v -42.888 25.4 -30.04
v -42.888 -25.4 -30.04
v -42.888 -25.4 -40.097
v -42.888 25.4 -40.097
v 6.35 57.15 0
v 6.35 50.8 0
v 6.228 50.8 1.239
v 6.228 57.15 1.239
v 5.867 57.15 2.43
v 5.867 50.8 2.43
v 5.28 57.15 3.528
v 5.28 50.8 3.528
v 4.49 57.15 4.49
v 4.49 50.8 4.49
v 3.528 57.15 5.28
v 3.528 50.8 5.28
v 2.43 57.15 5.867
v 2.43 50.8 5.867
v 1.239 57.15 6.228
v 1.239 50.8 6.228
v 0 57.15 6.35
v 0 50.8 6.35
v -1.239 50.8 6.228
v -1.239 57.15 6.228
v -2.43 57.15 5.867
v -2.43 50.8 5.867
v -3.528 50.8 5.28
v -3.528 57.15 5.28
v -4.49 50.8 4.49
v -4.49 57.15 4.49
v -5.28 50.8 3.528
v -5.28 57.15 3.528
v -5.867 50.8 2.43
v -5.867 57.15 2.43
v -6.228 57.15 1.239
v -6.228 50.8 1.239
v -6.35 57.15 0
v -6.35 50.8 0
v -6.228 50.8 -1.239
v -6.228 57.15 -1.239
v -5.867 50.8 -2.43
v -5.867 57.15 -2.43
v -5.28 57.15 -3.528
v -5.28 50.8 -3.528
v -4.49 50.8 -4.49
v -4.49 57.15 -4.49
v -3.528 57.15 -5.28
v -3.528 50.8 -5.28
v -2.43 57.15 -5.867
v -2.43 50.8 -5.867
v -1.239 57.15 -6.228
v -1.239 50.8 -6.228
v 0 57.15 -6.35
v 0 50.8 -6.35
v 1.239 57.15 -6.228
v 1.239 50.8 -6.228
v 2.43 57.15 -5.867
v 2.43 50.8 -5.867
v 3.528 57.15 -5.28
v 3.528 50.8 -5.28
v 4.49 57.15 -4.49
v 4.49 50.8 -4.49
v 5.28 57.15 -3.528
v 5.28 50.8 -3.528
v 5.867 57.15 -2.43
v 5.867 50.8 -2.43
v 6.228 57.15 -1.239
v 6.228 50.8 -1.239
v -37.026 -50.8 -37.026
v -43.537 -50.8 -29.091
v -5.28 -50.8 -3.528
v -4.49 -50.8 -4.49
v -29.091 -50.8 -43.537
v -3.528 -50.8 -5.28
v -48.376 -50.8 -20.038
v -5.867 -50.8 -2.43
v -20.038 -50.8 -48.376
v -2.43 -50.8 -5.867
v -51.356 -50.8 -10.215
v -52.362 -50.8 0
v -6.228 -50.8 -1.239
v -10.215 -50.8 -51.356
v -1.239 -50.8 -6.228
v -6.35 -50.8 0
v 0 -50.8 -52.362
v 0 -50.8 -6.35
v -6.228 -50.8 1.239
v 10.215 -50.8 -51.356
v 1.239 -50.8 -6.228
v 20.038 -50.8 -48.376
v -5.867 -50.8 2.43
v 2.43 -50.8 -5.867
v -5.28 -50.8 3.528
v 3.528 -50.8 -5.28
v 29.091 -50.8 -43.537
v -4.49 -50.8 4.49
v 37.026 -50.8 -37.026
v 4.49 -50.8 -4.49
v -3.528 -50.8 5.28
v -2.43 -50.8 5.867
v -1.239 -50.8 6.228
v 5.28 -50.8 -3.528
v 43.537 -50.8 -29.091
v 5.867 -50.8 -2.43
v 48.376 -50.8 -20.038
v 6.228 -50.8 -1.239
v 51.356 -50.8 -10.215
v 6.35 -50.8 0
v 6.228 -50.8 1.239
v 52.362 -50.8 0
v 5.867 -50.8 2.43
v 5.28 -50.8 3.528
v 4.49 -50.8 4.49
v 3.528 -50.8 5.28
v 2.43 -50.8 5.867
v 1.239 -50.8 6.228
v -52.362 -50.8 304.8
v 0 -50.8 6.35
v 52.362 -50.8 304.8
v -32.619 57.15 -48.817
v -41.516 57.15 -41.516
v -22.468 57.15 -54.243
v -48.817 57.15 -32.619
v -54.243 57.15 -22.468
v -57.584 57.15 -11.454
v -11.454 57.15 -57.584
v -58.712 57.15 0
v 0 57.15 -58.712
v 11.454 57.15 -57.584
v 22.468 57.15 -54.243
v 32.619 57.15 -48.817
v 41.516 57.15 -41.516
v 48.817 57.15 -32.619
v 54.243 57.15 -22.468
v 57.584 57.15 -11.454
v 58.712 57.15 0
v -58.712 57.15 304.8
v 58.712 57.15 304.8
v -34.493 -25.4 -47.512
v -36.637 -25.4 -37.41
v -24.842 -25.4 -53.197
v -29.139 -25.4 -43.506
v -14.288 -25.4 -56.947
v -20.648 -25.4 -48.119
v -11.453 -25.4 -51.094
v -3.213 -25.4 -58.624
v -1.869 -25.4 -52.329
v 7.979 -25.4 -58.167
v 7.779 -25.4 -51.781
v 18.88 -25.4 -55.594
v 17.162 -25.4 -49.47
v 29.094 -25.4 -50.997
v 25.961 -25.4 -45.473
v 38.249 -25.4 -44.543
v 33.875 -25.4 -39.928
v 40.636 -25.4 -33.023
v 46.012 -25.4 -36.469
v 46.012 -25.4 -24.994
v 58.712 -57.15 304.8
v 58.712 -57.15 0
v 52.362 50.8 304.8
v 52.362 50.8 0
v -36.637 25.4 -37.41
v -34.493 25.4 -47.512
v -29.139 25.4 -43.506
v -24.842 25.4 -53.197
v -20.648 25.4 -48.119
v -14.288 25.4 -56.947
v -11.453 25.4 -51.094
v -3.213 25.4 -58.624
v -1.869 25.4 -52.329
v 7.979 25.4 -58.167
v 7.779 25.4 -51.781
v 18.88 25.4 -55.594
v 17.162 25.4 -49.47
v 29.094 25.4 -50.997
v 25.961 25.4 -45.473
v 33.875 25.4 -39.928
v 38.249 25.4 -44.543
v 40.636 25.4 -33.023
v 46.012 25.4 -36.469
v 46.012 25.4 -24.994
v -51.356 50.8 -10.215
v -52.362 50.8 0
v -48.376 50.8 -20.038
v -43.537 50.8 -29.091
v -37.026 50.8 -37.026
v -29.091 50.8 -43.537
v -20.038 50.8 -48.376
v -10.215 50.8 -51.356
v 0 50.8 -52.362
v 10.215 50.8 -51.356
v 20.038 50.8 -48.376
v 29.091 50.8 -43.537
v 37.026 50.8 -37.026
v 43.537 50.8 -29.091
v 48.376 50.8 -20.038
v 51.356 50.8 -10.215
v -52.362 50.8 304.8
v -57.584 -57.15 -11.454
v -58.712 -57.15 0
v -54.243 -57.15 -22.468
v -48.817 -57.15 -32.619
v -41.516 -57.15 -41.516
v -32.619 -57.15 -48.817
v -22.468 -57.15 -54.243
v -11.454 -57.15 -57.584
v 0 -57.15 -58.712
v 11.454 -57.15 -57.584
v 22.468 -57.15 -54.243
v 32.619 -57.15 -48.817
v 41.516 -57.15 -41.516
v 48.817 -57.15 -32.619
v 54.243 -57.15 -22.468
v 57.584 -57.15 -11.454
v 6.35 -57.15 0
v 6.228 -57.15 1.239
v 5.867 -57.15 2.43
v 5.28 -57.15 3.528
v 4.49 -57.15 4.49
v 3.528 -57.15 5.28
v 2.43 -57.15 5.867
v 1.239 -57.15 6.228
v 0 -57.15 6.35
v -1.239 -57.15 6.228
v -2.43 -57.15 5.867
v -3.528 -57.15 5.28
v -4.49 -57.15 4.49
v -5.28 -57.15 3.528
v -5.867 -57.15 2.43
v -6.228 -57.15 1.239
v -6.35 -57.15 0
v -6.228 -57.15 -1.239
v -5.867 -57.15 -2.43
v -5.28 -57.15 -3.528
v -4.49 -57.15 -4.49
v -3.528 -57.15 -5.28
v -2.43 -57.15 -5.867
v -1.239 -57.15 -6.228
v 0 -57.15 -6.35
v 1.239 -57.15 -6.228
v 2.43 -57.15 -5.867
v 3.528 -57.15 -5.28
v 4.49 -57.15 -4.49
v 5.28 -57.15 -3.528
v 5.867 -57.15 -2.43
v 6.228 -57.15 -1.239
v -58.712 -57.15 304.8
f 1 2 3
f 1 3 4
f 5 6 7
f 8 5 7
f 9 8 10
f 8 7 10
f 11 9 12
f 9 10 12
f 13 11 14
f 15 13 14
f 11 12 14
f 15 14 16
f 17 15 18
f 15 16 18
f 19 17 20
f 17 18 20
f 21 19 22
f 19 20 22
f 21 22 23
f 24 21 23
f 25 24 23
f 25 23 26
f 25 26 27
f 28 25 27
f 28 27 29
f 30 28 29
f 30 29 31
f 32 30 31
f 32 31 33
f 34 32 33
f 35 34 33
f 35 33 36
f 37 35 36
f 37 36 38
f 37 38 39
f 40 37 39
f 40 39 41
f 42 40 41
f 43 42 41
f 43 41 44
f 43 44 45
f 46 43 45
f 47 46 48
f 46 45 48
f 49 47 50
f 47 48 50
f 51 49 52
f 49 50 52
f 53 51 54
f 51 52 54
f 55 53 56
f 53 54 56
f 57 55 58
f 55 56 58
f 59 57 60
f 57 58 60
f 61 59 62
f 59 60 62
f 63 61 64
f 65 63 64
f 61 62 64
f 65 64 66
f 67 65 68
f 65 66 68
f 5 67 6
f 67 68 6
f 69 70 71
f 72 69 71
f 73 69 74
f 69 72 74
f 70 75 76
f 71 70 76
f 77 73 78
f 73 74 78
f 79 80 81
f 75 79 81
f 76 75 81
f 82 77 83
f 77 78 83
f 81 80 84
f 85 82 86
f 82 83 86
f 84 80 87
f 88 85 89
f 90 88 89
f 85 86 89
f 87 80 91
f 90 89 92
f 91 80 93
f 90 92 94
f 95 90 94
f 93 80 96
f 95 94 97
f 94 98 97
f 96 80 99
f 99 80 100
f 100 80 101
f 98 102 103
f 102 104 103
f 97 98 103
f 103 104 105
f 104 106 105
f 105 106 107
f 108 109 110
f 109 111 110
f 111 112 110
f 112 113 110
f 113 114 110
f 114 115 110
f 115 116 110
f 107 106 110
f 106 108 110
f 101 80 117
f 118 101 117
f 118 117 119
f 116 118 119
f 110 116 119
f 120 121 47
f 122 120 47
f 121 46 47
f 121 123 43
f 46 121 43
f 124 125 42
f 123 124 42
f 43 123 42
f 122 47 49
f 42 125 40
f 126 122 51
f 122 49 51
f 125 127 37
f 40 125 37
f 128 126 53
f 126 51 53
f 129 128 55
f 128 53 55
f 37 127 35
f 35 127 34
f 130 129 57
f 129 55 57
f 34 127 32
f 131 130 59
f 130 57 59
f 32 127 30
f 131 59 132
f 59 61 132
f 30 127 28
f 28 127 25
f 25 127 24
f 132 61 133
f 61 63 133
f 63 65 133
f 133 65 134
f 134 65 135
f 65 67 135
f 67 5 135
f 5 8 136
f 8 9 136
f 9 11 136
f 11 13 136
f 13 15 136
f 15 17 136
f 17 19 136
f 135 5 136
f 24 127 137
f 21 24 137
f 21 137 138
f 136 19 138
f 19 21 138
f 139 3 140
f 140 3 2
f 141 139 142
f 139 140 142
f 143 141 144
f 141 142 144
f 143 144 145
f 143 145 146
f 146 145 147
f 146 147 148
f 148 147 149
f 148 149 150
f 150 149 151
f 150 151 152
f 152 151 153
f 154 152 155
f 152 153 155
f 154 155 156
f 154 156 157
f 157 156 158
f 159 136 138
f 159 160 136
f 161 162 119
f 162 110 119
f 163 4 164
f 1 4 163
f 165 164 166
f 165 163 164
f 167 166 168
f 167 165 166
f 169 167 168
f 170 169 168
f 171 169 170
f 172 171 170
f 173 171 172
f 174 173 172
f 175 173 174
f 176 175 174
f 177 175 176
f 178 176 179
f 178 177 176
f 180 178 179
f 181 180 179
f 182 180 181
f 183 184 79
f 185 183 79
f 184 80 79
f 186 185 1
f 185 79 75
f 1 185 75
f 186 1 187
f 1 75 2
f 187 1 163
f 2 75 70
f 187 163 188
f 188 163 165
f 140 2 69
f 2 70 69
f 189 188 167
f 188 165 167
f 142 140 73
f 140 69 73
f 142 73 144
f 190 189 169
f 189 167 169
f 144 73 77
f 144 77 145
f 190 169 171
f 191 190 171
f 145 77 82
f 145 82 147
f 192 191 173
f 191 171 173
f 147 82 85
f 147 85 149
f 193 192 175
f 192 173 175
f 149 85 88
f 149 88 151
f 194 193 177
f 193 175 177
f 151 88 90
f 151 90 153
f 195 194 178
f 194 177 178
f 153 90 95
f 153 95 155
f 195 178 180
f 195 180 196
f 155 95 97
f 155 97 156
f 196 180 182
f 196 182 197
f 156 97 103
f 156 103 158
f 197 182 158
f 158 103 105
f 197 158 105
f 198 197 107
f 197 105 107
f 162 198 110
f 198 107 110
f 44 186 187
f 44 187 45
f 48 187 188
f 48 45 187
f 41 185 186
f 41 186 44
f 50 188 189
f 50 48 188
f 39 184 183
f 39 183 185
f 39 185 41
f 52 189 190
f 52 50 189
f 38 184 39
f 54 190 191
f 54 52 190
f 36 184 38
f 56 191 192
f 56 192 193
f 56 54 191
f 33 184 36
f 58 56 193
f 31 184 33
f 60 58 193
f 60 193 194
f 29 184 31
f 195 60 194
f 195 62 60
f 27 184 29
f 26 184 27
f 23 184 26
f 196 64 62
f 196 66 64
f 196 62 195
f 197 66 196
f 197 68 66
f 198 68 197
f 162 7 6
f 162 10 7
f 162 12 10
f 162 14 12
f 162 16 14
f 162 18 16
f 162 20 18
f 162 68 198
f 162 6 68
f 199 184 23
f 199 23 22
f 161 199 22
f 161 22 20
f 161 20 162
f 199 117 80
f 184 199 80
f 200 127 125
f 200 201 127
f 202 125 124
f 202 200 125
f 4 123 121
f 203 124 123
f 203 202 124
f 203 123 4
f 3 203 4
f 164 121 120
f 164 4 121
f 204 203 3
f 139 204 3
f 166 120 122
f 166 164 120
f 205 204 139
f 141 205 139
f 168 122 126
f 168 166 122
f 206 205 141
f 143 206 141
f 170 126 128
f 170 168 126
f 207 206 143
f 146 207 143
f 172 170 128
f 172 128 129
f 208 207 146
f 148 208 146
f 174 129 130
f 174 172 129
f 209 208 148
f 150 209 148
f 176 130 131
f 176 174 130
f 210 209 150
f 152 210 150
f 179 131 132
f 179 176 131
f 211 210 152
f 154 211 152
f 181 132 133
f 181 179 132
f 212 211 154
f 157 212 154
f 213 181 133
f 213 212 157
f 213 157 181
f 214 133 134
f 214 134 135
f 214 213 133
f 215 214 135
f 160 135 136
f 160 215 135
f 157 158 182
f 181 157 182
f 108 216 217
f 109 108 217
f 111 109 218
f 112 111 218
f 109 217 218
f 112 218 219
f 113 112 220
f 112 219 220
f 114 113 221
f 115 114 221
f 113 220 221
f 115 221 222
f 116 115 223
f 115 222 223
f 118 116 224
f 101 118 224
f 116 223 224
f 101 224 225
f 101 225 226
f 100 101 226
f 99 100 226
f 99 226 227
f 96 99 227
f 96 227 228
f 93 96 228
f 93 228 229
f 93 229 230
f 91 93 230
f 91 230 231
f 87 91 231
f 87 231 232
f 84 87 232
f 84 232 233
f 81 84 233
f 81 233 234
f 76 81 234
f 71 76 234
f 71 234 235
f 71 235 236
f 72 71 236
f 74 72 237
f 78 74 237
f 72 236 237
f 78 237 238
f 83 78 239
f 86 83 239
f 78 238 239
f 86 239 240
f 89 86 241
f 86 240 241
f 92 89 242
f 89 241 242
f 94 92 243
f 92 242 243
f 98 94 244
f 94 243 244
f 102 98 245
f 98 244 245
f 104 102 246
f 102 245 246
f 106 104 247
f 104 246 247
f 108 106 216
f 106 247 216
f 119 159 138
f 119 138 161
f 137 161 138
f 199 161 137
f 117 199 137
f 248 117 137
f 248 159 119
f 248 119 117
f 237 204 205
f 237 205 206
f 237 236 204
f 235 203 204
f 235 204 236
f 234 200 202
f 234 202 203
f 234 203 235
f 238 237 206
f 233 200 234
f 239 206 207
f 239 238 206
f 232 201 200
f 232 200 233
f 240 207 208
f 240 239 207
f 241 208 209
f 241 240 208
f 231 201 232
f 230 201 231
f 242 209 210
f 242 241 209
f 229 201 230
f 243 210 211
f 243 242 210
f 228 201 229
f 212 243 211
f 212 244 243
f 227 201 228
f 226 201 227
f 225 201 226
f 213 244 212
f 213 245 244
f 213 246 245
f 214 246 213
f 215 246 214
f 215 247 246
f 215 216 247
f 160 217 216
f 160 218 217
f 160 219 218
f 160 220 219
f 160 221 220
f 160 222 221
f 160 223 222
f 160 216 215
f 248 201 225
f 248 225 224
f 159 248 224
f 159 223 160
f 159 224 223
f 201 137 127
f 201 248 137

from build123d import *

# Parameters (mm, degrees)
F1_DEPTH = 50.8
F2_DEPTH = 50.8
F3_DEPTH = 50.8
F4_T     = 6.35
F5_R     = 6.35
F6_DEPTH = 114.301
F7_W     = 88.9
F7_H     = 50.8
F8_DEPTH = 58.7131


with BuildPart() as f1:
    # F0 (on Front) → F1 (new body, symmetric)
    with BuildSketch(Plane.XZ):
        with BuildLine():
            ThreePointArc((-52.3621, 0), (0, -52.3621), (52.3621, 0))
            ThreePointArc((52.3621, 0), (0, 52.3621), (-52.3621, 0))
        make_face()
    extrude(amount=F1_DEPTH, both=True)

    # F0 (on Front) → F2 (join)
    with BuildSketch(Plane.XZ):
        with BuildLine():
            ThreePointArc((-52.3621, 0), (0, 52.3621), (52.3621, 0))
            Line((52.3621, 0), (52.3621, 304.8))
            Line((52.3621, 304.8), (-52.3621, 304.8))
            Line((-52.3621, 304.8), (-52.3621, 0))
        make_face()
    extrude(amount=F2_DEPTH)

    # F0 (on Front) → F3 (join)
    with BuildSketch(Plane.XZ):
        with BuildLine():
            ThreePointArc((-52.3621, 0), (0, 52.3621), (52.3621, 0))
            Line((52.3621, 0), (52.3621, 304.8))
            Line((52.3621, 304.8), (-52.3621, 304.8))
            Line((-52.3621, 304.8), (-52.3621, 0))
        make_face()
    extrude(amount=-F3_DEPTH)

    # F4
    f4_openings = [f1.faces().sort_by_distance(p)[0] for p in [
        (0, 0, 304.8),
    ]]
    offset(amount=F4_T, openings=f4_openings, kind=Kind.INTERSECTION)

    # F5 (on face) → F6 (cut, through all)
    with BuildSketch(Plane.XZ.offset(57.15)):
        Circle(F5_R)
    extrude(amount=-F6_DEPTH, mode=Mode.SUBTRACT)

    # F7 (on Top) → F8 (cut, through all)
    with BuildSketch(Plane.XY):
        with Locations((1.5621, 0)):
            Rectangle(F7_W, F7_H)
    extrude(amount=-F8_DEPTH, mode=Mode.SUBTRACT)


solid = f1.part
